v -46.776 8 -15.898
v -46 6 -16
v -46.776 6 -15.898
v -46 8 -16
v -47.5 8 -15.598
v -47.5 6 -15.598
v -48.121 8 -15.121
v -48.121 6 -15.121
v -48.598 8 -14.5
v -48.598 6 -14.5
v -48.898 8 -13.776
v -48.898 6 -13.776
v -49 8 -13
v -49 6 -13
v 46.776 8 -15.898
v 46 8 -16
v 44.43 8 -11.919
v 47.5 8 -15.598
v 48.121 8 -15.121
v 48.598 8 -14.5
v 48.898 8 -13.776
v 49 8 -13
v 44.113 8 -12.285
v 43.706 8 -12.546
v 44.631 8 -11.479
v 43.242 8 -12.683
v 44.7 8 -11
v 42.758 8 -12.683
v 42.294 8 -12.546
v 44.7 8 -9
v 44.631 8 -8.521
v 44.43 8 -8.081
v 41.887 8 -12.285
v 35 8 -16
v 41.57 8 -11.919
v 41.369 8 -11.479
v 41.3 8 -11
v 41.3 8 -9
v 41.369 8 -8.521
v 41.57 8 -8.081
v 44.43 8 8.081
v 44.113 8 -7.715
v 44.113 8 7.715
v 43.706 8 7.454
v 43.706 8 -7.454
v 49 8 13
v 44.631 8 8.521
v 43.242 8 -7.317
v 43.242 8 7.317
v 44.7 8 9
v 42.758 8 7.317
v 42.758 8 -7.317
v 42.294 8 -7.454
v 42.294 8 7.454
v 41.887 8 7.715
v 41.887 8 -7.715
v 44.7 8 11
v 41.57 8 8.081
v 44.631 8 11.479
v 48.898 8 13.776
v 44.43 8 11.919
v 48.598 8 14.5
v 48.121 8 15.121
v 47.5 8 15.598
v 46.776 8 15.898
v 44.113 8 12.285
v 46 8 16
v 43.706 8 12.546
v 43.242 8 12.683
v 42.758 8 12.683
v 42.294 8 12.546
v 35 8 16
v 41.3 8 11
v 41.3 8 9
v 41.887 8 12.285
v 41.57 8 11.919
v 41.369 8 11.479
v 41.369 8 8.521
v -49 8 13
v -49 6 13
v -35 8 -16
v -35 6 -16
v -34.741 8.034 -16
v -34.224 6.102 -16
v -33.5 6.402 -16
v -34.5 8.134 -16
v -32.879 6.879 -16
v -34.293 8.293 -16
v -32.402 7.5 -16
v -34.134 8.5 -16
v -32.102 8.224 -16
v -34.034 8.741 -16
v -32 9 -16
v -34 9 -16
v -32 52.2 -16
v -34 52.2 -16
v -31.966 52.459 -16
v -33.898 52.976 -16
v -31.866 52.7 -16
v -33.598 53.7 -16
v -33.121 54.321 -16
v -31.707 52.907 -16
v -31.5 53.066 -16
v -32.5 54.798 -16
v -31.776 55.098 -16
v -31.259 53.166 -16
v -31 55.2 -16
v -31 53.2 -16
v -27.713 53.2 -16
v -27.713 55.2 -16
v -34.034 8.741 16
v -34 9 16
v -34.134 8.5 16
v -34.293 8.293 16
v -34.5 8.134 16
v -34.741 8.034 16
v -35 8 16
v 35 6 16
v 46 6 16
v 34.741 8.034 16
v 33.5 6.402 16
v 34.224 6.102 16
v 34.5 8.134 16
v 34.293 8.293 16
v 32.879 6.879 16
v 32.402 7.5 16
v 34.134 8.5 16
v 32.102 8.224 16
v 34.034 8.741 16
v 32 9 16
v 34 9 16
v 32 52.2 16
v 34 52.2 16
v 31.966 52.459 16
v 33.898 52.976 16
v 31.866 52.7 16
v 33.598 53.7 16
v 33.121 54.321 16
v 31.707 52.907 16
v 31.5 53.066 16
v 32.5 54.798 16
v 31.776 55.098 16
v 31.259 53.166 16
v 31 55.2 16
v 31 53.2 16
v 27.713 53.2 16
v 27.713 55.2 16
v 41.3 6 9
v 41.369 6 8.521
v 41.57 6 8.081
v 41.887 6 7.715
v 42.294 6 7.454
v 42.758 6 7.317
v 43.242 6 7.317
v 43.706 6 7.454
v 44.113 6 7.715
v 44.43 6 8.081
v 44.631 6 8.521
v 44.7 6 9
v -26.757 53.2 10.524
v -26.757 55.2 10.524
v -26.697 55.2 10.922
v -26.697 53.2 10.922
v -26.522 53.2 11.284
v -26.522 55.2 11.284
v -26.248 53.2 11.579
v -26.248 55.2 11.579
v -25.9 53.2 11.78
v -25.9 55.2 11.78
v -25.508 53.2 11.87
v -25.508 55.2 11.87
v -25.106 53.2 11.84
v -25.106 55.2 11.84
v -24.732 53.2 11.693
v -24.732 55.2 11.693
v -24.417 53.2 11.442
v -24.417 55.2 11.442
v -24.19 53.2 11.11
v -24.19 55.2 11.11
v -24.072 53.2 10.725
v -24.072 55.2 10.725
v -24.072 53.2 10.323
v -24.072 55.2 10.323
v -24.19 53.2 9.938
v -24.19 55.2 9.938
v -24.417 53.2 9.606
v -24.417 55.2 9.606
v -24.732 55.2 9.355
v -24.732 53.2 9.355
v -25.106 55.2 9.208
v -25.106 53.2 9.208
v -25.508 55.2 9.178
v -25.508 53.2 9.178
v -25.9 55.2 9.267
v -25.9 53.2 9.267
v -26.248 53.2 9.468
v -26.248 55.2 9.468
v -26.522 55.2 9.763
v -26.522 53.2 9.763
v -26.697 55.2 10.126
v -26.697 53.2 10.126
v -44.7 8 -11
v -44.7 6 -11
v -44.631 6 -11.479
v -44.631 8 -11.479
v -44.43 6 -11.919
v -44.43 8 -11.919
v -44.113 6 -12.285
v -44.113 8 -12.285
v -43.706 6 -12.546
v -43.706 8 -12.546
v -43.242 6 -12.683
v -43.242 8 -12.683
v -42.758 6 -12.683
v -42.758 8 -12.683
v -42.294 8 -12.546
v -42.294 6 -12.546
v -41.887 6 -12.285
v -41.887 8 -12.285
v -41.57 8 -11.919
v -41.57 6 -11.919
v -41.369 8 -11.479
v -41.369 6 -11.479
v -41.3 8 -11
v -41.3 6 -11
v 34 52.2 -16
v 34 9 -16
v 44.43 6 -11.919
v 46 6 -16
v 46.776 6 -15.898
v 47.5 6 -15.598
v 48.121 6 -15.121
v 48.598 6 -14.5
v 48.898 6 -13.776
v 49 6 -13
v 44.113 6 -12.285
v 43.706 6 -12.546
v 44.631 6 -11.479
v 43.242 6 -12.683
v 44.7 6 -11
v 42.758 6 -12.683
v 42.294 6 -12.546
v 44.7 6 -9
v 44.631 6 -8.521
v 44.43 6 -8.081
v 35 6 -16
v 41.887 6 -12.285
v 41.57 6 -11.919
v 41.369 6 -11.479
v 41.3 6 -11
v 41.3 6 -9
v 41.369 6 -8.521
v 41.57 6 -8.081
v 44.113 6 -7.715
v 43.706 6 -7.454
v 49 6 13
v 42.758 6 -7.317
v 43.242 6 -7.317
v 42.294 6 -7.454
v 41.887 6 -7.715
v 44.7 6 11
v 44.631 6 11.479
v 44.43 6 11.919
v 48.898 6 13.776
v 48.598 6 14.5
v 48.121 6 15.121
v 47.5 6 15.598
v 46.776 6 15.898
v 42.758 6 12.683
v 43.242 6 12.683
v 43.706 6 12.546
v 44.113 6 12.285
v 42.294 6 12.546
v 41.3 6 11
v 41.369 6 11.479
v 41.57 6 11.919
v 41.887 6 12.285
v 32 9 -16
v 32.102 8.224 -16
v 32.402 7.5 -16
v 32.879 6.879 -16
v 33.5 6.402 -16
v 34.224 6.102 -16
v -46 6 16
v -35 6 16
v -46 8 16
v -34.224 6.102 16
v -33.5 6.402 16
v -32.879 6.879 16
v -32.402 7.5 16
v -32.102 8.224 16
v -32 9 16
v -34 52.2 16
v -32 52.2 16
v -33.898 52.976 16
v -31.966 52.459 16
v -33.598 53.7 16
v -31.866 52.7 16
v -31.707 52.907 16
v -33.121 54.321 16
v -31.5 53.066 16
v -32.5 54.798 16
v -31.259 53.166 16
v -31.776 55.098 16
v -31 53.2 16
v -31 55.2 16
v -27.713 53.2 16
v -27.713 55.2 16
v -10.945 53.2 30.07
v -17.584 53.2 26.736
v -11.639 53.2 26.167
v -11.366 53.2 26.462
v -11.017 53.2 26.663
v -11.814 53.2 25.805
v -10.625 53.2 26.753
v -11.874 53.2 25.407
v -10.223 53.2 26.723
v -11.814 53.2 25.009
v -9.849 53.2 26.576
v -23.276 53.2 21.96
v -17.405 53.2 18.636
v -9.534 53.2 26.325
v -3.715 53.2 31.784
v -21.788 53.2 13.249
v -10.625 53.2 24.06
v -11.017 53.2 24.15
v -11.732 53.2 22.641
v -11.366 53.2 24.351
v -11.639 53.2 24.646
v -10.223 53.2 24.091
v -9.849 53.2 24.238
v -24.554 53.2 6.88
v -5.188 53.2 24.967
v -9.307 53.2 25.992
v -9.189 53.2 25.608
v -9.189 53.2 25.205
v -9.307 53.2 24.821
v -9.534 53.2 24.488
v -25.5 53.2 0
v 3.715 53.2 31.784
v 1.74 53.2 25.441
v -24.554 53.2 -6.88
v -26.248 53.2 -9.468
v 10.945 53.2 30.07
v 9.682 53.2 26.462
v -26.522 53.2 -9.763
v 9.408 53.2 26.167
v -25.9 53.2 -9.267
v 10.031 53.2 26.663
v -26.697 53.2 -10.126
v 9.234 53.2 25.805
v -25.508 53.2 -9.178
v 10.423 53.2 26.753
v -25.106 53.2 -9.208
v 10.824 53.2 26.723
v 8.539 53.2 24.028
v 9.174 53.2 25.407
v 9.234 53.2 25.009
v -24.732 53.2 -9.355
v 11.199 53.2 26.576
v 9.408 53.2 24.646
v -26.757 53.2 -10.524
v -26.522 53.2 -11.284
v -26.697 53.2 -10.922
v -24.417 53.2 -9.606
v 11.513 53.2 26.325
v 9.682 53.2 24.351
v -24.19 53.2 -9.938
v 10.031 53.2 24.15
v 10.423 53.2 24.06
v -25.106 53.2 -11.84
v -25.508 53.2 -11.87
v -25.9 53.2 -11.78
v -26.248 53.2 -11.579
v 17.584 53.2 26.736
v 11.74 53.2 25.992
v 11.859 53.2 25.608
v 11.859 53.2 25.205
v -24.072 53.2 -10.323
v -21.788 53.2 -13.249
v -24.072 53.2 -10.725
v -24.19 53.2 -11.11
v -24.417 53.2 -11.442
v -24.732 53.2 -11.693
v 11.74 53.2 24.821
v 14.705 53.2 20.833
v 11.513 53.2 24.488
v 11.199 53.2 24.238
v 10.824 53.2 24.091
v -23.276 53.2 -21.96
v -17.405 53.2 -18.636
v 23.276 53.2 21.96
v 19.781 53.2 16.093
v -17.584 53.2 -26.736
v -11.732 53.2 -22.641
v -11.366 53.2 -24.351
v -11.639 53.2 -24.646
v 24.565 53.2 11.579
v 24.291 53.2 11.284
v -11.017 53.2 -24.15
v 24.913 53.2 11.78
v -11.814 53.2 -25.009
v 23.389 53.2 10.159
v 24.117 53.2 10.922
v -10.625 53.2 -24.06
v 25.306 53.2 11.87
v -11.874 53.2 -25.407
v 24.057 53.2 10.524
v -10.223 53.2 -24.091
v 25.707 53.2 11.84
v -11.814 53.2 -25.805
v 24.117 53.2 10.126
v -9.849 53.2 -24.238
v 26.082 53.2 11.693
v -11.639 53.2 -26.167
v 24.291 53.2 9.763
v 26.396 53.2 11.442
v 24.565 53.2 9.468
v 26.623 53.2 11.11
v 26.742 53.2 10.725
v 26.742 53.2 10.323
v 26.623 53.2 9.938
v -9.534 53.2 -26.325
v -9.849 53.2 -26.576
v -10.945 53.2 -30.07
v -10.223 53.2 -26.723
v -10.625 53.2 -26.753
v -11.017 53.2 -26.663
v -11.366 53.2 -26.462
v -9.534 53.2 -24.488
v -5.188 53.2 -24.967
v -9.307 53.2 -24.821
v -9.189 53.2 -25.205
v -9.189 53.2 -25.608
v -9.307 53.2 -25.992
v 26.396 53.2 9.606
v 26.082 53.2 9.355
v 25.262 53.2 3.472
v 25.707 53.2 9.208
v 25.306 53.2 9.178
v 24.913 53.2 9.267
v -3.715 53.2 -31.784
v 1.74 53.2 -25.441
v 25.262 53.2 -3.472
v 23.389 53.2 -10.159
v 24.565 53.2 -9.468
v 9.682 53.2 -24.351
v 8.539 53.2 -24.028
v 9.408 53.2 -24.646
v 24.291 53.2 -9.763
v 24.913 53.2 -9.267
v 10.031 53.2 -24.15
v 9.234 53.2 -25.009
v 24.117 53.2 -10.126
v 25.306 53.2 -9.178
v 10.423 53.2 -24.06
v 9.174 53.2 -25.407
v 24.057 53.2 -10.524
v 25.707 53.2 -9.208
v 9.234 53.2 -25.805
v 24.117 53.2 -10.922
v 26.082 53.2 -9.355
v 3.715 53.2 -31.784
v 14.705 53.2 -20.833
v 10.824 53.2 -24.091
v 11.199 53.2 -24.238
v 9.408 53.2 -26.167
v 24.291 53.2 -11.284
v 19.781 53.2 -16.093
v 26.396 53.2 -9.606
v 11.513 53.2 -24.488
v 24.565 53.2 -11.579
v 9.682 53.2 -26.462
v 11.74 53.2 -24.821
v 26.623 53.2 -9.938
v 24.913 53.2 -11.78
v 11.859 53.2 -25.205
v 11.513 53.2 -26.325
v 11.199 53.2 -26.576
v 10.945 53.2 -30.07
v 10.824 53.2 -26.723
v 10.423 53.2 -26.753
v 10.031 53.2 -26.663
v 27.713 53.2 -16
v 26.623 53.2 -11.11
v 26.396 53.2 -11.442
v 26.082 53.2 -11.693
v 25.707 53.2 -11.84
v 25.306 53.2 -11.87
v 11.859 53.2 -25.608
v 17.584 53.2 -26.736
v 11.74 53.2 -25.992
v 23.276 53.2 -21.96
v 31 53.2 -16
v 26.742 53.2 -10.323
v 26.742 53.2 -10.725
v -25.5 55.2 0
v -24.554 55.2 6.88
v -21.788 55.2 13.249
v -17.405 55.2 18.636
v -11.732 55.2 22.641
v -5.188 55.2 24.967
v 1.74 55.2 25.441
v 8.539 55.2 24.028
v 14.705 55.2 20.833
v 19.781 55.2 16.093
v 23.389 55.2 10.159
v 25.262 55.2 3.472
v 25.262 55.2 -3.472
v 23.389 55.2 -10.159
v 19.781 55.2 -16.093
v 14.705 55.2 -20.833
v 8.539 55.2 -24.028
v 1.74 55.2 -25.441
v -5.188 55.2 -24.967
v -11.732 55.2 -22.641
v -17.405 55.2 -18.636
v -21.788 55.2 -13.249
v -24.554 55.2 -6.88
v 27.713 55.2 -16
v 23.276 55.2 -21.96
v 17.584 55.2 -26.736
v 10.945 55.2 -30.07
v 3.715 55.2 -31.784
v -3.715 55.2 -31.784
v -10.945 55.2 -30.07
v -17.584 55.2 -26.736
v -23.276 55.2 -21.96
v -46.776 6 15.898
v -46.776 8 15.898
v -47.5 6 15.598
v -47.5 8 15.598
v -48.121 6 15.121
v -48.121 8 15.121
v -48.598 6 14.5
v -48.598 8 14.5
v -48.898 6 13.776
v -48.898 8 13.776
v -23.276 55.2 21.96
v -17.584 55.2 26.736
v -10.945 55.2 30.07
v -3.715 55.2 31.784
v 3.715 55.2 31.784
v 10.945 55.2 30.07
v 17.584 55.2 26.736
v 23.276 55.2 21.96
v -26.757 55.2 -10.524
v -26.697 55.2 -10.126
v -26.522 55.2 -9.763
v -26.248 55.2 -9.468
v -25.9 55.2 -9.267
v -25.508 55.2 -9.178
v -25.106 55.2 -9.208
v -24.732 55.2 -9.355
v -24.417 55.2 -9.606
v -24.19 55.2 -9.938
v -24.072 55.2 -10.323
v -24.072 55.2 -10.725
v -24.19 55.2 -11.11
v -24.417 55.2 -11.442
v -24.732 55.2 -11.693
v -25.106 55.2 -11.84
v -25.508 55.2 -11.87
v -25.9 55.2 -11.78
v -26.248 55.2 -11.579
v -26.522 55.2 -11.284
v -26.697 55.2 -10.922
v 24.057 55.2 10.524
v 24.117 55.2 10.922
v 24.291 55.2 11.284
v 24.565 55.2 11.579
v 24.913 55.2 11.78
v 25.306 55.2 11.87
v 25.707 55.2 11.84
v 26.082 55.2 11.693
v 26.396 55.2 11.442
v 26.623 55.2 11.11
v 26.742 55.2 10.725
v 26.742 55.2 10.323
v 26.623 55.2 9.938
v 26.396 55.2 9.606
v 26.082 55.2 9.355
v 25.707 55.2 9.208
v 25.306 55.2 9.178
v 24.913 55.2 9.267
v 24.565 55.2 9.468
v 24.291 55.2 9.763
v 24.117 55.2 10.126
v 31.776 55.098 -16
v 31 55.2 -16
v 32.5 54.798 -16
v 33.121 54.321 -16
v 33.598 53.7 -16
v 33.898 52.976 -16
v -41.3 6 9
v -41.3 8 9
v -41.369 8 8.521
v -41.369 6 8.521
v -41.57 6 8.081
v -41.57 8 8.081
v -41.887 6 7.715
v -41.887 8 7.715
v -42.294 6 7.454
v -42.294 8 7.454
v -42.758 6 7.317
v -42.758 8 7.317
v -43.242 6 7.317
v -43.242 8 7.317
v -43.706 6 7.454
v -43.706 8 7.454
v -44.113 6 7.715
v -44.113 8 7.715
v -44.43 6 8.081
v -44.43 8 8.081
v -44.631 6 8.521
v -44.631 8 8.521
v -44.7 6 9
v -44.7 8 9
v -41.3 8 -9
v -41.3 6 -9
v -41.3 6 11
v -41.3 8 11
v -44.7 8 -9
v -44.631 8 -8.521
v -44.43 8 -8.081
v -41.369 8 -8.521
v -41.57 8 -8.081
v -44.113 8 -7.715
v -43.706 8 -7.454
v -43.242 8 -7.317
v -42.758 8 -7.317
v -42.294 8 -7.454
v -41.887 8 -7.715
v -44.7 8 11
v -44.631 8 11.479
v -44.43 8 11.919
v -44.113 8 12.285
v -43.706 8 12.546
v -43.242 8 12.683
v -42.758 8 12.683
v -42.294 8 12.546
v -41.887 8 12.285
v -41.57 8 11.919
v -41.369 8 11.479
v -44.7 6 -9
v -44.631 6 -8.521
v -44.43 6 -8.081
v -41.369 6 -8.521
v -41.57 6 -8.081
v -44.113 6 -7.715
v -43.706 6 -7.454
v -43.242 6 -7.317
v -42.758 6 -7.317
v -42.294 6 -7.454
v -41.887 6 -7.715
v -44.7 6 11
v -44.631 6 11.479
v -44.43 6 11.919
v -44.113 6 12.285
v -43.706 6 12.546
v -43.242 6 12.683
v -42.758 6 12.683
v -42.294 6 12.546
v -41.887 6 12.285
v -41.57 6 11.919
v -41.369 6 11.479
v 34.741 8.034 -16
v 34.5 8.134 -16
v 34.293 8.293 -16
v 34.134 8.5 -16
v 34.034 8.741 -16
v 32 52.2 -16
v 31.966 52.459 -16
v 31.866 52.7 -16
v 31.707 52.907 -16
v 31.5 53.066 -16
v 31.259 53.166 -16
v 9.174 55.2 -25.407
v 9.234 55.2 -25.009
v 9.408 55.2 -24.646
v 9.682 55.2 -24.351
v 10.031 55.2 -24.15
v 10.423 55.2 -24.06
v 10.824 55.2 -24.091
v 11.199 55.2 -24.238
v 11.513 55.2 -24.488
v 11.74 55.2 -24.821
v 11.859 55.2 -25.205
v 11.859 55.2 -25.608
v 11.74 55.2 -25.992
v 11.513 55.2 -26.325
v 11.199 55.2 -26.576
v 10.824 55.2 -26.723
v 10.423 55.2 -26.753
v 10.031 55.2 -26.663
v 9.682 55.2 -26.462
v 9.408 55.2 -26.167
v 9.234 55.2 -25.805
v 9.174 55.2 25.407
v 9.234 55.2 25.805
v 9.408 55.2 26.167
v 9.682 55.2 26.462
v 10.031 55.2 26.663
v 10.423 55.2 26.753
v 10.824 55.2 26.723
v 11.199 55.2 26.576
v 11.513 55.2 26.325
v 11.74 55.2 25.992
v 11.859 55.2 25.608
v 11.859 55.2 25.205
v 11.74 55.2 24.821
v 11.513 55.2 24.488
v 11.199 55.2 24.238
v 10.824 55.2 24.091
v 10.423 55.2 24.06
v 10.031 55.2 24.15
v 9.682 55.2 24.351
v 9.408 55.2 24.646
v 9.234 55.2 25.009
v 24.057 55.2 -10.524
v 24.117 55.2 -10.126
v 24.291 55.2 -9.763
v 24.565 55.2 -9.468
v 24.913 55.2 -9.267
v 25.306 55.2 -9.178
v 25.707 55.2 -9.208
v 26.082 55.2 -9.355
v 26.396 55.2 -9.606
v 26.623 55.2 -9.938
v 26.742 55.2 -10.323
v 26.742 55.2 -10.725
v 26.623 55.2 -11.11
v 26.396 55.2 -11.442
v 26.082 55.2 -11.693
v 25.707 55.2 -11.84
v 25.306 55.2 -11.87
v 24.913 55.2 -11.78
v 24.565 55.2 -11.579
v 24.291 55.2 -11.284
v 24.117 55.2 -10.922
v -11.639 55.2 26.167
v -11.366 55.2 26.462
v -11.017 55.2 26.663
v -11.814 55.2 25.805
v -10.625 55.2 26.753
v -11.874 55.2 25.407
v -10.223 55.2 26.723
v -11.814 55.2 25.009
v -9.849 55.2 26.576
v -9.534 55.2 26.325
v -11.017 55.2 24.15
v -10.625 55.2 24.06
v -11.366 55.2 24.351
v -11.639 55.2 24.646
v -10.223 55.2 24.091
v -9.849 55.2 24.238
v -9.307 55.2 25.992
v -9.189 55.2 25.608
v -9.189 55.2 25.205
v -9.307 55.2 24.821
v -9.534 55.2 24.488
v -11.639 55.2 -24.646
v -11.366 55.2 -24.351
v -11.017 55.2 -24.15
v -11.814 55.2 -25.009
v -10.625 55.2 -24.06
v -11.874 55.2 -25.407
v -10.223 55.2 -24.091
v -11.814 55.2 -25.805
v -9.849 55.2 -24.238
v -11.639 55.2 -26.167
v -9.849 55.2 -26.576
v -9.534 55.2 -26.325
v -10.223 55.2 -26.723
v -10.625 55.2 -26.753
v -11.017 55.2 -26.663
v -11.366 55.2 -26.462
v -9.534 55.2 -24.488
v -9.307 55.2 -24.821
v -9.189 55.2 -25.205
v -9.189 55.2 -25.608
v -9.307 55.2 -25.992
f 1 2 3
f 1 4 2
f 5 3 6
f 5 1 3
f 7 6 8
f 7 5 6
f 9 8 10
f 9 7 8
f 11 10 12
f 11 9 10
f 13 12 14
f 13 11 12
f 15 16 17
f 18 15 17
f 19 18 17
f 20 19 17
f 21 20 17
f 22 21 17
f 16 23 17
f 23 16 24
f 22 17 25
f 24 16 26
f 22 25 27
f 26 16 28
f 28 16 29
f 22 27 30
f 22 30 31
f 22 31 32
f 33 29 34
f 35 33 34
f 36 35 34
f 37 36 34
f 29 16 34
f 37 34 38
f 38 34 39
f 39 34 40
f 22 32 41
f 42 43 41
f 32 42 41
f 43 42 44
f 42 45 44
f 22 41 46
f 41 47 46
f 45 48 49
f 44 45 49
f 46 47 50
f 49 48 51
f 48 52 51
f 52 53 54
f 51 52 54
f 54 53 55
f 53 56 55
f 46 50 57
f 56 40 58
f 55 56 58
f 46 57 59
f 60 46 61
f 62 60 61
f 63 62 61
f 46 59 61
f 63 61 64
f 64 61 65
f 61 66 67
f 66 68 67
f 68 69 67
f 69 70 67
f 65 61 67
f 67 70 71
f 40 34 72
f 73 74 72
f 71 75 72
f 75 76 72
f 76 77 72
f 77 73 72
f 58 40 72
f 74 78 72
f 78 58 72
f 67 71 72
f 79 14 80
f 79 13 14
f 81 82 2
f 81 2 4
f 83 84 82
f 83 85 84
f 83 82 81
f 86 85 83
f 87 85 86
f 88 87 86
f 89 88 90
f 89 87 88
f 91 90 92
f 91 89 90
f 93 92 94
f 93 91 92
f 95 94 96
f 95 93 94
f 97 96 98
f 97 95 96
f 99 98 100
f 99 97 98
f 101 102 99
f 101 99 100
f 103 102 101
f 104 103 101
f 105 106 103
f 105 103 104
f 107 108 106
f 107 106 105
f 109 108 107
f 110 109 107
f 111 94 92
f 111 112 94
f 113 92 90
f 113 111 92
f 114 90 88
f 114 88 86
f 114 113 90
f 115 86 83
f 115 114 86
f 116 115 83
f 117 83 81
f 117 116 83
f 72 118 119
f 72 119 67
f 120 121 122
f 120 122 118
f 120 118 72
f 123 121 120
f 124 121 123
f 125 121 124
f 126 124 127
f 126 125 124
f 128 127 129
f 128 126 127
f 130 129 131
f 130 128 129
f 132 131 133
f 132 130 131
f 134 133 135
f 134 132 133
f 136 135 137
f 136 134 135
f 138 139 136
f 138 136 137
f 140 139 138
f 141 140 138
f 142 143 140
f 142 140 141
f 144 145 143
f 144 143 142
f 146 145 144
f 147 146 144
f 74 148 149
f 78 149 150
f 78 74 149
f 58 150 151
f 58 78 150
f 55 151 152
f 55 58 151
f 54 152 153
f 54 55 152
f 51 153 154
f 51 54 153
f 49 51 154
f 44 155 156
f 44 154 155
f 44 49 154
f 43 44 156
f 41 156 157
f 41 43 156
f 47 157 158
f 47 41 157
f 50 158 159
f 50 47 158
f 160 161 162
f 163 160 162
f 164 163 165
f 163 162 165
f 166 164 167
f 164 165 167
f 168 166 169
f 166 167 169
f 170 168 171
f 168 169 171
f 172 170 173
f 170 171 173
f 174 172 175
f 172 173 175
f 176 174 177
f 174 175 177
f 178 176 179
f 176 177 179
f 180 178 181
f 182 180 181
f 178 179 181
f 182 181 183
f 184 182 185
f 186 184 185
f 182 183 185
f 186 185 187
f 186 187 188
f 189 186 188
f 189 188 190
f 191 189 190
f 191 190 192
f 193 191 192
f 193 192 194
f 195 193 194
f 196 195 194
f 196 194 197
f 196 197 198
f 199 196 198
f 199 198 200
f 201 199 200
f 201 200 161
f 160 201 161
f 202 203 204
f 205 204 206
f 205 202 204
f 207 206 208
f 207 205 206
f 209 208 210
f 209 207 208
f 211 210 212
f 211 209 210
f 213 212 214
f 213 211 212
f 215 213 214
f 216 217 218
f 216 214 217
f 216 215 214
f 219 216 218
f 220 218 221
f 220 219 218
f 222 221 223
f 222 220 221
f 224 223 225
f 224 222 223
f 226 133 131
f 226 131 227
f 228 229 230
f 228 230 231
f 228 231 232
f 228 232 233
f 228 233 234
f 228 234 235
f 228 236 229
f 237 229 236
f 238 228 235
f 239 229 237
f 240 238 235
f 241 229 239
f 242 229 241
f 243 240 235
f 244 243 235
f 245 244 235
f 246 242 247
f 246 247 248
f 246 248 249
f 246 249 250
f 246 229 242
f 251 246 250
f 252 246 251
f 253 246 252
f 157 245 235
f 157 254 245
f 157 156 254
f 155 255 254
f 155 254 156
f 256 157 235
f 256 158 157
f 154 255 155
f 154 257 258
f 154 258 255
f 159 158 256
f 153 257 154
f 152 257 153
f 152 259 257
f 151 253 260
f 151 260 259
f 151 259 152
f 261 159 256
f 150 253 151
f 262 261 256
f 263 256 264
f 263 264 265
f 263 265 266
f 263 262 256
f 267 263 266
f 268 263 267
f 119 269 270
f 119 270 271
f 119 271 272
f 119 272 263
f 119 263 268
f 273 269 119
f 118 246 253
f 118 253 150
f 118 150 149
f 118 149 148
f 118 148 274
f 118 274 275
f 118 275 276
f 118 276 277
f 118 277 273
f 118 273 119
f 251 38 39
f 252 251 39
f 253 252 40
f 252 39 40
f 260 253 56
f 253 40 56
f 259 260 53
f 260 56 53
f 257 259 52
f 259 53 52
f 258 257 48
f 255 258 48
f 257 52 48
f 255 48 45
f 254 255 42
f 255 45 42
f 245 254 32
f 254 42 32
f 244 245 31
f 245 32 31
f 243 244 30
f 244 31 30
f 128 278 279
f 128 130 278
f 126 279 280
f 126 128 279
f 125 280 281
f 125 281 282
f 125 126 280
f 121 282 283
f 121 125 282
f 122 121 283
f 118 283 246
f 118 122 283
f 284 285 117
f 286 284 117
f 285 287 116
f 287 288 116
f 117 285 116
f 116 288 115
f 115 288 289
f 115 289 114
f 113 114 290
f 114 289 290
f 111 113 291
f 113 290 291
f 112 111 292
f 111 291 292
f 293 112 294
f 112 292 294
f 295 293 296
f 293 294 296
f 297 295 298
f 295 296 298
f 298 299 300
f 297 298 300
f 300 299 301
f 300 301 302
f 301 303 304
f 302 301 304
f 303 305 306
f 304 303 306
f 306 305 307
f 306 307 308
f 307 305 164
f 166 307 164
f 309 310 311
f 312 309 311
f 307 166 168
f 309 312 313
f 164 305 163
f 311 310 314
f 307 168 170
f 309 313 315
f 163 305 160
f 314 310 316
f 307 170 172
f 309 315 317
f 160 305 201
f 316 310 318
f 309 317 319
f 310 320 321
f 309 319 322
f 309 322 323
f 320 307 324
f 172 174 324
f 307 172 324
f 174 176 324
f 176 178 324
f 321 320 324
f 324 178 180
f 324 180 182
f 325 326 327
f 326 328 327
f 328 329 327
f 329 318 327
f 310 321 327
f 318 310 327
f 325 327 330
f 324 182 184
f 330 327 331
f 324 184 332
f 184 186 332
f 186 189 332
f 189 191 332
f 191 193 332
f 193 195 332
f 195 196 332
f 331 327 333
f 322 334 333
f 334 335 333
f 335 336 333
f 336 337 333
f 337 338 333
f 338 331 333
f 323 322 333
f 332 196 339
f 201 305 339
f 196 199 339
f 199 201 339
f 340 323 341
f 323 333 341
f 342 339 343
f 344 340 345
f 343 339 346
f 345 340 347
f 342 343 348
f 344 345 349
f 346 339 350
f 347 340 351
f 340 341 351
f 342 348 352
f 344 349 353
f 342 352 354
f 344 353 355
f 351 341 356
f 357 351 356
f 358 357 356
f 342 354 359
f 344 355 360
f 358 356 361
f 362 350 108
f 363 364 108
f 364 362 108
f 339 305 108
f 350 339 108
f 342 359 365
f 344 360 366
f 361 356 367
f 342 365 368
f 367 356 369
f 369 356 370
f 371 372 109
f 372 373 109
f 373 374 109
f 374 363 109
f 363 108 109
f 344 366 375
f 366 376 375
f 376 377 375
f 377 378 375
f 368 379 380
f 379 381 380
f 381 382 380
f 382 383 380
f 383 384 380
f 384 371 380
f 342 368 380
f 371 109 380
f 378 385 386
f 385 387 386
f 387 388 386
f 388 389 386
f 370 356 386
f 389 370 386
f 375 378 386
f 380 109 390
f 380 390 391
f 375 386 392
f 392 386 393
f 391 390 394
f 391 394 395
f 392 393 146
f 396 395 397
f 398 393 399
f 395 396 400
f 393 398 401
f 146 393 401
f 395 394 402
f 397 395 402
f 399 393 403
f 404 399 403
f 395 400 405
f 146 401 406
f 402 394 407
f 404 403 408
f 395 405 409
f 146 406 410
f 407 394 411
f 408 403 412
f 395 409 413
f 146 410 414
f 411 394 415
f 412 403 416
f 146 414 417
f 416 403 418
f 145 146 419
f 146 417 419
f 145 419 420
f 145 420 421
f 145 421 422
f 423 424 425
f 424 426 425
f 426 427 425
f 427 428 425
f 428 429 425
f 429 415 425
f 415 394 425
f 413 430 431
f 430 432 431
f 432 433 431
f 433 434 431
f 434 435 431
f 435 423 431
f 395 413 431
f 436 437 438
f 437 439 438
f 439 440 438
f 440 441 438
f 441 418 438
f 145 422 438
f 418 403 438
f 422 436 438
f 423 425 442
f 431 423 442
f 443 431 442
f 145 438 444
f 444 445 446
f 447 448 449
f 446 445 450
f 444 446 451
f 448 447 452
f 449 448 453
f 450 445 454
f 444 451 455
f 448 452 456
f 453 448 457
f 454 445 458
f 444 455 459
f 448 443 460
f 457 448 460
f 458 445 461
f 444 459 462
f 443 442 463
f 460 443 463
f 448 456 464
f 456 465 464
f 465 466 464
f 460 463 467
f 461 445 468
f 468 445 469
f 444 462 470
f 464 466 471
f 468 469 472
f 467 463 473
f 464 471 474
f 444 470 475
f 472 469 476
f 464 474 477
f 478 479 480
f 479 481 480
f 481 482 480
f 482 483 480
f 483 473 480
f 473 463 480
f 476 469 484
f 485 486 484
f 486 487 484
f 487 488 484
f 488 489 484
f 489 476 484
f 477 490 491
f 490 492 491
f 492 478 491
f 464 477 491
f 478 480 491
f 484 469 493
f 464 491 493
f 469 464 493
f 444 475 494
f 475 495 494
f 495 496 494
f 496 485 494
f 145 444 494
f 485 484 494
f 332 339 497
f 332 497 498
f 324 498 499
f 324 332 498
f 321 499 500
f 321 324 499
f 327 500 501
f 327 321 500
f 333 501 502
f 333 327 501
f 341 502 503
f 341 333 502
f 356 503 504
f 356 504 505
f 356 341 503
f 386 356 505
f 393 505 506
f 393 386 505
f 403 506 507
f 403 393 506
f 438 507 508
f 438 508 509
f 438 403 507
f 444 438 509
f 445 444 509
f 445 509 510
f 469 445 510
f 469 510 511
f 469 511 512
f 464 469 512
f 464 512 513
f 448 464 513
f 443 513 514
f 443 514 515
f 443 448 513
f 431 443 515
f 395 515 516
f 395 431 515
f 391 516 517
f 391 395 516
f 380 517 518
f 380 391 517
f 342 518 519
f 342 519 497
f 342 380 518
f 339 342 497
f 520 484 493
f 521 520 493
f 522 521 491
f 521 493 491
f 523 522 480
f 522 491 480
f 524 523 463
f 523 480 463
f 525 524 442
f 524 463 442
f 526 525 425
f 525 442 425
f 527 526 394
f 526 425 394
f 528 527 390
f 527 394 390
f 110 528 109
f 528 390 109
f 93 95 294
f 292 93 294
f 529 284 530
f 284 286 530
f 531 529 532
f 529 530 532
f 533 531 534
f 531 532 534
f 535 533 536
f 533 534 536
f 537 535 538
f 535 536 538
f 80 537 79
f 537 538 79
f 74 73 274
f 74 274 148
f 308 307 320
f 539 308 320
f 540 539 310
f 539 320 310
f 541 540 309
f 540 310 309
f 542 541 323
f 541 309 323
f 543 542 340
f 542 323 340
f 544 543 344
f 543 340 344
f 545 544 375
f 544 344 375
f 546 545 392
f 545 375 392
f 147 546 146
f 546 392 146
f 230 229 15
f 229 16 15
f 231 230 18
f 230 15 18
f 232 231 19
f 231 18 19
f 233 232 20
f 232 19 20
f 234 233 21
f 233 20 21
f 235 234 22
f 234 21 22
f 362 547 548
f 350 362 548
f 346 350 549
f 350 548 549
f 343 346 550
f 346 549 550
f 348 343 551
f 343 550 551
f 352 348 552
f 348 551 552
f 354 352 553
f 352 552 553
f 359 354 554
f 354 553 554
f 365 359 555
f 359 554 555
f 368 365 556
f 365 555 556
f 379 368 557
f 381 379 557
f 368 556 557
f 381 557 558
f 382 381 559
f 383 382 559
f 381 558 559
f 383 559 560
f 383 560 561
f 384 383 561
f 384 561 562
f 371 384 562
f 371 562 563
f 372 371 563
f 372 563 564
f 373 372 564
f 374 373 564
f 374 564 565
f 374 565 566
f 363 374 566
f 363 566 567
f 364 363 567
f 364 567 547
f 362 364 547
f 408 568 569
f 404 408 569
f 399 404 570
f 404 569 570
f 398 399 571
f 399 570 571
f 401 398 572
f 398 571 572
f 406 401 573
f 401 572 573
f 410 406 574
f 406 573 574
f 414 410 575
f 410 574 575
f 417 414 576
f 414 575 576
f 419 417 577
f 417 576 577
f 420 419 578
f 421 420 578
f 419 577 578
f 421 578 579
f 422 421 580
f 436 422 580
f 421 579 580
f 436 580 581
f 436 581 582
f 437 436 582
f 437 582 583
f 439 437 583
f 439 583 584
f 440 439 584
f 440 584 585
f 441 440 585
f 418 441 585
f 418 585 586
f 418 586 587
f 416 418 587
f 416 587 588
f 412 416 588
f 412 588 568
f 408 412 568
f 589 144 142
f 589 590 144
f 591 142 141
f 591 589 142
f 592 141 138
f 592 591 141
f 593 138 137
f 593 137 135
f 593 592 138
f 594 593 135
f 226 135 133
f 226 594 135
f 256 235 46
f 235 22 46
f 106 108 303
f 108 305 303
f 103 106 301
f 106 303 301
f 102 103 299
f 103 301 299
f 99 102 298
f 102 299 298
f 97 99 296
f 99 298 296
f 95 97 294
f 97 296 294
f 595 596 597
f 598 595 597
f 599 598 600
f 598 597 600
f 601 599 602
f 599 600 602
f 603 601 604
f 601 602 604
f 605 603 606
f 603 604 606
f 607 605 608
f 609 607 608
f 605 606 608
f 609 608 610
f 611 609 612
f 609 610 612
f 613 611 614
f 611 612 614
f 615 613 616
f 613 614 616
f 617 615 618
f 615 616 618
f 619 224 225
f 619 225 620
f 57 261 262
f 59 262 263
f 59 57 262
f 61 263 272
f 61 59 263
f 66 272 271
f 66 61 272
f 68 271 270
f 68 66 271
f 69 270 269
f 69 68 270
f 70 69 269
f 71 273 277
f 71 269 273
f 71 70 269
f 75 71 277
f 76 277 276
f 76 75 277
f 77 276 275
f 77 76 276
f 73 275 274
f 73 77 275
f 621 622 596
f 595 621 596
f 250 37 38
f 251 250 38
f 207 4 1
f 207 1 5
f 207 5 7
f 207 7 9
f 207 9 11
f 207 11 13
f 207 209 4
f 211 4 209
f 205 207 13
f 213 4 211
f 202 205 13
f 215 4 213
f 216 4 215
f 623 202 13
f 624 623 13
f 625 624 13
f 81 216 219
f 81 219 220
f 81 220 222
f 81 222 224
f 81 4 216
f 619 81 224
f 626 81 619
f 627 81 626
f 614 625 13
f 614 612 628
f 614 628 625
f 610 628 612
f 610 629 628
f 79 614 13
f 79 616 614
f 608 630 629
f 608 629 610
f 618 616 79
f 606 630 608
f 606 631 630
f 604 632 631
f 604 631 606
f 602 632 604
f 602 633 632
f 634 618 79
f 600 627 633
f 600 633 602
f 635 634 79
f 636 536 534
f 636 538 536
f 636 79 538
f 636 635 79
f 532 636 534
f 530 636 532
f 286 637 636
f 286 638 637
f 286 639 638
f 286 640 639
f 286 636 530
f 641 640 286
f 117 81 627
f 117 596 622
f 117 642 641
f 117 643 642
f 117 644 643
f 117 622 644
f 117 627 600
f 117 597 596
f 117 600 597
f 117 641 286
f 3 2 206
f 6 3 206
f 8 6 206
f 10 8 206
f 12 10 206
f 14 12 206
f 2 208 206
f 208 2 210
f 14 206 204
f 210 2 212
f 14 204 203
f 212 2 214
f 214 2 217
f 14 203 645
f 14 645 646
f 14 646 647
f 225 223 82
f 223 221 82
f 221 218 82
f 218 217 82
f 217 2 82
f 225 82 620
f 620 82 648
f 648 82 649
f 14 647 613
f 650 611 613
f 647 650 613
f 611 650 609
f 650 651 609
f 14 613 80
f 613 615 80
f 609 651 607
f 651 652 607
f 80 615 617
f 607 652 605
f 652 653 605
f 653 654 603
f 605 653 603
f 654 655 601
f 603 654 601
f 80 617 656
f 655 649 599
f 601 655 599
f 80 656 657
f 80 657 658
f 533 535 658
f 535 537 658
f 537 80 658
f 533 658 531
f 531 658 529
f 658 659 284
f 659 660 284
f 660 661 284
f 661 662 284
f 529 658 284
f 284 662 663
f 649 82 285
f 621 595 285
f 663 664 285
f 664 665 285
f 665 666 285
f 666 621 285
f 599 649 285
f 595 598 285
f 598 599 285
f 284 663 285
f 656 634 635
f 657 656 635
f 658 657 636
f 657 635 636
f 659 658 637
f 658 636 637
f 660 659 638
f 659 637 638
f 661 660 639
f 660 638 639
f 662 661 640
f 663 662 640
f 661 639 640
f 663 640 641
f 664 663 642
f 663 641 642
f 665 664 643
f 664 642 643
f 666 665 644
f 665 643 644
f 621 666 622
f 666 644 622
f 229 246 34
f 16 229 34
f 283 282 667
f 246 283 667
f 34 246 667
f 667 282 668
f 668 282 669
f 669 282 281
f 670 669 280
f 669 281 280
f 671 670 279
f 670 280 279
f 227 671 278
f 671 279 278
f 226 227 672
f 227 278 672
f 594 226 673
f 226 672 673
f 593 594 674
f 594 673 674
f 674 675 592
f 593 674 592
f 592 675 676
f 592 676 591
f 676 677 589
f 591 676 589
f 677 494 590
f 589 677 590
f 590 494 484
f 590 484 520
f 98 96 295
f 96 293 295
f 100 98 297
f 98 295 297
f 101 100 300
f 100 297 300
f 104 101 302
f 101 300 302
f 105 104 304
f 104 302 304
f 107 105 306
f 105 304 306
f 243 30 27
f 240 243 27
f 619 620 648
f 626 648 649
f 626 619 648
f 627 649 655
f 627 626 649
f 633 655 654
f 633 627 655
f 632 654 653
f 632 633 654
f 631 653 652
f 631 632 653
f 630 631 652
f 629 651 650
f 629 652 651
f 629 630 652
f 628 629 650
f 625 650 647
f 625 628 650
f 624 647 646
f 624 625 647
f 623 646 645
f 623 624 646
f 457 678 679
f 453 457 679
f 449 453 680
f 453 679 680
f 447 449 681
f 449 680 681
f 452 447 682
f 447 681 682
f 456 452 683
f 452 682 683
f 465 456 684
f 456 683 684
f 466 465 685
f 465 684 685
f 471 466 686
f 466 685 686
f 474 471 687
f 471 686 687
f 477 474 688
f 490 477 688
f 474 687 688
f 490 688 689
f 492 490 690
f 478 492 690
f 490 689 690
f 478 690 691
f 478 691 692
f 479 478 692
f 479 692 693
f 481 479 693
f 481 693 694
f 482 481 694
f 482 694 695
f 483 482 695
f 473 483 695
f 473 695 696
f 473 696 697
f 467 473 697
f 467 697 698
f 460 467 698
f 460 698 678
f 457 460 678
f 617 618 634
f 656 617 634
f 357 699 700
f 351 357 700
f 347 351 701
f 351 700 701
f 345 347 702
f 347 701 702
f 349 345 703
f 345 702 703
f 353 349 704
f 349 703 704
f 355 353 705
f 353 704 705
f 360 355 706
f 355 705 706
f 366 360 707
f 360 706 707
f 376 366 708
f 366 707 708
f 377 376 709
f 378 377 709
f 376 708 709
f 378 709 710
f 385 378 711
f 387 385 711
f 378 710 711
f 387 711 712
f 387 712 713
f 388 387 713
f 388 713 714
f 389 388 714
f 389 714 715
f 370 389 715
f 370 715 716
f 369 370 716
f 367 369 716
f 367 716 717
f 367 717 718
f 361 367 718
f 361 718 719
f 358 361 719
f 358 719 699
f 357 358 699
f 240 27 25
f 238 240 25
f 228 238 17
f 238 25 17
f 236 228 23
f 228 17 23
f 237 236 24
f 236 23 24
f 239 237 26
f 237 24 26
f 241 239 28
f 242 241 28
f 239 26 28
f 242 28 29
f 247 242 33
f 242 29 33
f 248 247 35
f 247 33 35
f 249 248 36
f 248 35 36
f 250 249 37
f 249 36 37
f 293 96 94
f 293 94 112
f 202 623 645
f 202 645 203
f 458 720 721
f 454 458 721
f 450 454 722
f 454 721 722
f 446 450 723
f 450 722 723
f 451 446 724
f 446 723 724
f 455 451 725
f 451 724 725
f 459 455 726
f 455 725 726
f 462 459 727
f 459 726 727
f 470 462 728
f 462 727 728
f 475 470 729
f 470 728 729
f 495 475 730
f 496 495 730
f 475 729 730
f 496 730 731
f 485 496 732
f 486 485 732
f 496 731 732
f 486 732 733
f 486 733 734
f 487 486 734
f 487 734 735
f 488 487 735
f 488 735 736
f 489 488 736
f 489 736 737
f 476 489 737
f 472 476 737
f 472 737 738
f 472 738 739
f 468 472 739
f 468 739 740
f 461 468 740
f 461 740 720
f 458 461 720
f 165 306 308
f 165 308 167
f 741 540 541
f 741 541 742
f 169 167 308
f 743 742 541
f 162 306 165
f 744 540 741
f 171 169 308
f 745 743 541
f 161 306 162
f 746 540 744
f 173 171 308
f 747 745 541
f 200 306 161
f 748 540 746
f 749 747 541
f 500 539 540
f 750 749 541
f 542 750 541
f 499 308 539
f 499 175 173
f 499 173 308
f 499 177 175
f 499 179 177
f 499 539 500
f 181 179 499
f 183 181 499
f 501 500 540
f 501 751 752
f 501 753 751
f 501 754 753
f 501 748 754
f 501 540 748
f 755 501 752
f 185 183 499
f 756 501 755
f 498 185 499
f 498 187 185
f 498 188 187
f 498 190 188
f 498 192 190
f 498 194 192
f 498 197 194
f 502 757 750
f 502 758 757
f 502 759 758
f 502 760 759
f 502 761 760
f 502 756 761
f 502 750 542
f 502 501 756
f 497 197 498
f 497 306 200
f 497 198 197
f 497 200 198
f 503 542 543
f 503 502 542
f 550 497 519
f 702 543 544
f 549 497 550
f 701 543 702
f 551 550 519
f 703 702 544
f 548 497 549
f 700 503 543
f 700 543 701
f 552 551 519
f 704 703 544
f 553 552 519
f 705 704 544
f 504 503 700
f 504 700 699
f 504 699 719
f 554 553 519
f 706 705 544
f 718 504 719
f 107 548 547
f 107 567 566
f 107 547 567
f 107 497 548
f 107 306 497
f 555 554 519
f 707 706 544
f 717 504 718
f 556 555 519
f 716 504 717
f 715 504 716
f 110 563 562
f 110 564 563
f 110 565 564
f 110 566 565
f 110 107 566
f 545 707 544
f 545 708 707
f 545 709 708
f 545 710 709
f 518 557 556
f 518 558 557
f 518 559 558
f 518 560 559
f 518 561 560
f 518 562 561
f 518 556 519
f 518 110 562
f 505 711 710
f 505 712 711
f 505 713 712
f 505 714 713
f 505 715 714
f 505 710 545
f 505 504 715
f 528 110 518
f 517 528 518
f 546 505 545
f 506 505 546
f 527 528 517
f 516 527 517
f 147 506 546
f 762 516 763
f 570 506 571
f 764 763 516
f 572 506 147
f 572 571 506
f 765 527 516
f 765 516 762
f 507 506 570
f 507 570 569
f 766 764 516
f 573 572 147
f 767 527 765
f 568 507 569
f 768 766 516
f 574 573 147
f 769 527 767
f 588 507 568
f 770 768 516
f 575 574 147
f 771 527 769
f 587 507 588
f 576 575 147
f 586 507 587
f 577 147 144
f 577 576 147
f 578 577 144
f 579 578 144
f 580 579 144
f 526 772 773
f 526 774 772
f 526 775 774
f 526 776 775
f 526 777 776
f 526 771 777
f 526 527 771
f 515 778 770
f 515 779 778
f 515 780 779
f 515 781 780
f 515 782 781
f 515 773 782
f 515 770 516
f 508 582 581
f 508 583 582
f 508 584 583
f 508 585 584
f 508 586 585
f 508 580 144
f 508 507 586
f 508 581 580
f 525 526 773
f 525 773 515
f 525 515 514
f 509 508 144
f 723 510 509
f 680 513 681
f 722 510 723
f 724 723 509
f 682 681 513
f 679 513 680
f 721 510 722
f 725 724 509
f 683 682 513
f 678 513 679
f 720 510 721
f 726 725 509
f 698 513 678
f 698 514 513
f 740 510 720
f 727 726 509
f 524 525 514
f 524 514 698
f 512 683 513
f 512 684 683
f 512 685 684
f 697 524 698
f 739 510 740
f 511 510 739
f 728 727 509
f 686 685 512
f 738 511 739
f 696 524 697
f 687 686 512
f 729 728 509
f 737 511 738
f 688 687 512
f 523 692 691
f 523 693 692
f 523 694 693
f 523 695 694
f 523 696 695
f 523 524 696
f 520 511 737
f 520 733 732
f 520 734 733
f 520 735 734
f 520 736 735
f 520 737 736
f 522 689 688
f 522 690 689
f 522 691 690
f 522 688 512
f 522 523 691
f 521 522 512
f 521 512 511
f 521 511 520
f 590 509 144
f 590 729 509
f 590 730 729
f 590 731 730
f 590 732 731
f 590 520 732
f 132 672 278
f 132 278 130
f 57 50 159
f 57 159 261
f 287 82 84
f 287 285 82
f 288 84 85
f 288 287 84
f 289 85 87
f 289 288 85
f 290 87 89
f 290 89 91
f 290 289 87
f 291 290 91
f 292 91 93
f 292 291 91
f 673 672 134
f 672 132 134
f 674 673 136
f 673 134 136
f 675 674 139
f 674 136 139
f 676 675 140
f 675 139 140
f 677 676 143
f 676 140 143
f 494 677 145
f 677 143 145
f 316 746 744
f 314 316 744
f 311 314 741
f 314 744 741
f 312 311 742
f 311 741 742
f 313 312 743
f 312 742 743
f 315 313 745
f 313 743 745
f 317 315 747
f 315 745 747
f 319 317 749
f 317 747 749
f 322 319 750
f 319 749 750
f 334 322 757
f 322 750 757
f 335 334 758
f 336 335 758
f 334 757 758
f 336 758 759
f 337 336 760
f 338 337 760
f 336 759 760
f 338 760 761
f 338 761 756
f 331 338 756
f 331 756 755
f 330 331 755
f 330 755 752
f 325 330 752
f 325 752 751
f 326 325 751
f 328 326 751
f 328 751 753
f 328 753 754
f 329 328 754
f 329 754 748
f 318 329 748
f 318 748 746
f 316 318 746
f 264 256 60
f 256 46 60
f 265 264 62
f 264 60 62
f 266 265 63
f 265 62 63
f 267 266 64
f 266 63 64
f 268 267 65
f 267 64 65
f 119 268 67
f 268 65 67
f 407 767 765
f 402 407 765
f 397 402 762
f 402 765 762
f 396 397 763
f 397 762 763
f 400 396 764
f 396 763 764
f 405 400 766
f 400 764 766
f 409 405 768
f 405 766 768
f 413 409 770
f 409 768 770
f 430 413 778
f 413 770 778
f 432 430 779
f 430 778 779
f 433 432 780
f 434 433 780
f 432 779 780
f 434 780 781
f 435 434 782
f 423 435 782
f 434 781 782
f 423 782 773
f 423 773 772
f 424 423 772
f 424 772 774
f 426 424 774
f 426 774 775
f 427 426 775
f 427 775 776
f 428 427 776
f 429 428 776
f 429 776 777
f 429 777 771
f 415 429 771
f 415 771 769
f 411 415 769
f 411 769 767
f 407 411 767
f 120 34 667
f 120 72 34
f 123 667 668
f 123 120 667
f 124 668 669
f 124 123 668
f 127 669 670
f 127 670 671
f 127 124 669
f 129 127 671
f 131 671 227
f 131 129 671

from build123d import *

# Parameters (mm, degrees)
SKETCH_1_R          = 25.5
EXTRUDE_1_DEPTH     = 2
SKETCH_2_W          = 2
SKETCH_2_H          = 32
EXTRUDE_2_DEPTH     = 47.2
SKETCH_3_W          = 32
SKETCH_3_H          = 2
EXTRUDE_3_DEPTH     = 15
FILLET_1_R          = 3
FILLET_2_R          = 1
SKETCH_4_R          = 1.35
CUT_EXTRUDE_1_DEPTH = 10
CUT_EXTRUDE_2_DEPTH = 10
FILLET_3_R          = 3


with BuildPart() as part:
    # 草图1 → 凸台-拉伸1 (new body)
    with BuildSketch(Plane(origin=(0, 53.2, 0), x_dir=(1, 0, 0), z_dir=(0, 1, 0))):
        with BuildLine():
            Line((-34, 16), (-34, -16))
            Line((-34, -16), (-27.712812921, -16))
            ThreePointArc((-27.712812921, -16), (0, -32), (27.712812921, -16))
            Line((27.712812921, -16), (34, -16))
            Line((34, -16), (34, 16))
            Line((34, 16), (27.712812921, 16))
            ThreePointArc((27.712812921, 16), (0, 32), (-27.712812921, 16))
            Line((-27.712812921, 16), (-34, 16))
        make_face()
        with Locations(Location((0, 0, 0), (0, 0, 180))):
            Circle(SKETCH_1_R, mode=Mode.SUBTRACT)
    extrude(amount=EXTRUDE_1_DEPTH)

    # 草图2 → 凸台-拉伸2 (add)
    with BuildSketch(Plane.XZ.offset(-53.2)):
        with Locations((-33, 0)):
            Rectangle(SKETCH_2_W, SKETCH_2_H)
        with Locations((33, 0)):
            Rectangle(SKETCH_2_W, SKETCH_2_H)
    extrude(amount=EXTRUDE_2_DEPTH)

    # 草图3 → 凸台-拉伸3 (add)
    with BuildSketch(Plane.ZY.offset(34)):
        with Locations((0, 7)):
            Rectangle(SKETCH_3_W, SKETCH_3_H)
    extrude_3 = extrude(amount=EXTRUDE_3_DEPTH)

    # 镜向1: 凸台-拉伸3 across plane
    add(extrude_3.mirror(Plane.ZY))

    # 圆角1
    fillet_1_edges = [part.edges().sort_by_distance(p)[0] for p in [
        (34, 55.2, 0),
        (-32, 6, 0),
        (32, 6, 0),
        (-34, 55.2, 0),
    ]]
    fillet(fillet_1_edges, radius=FILLET_1_R)

    # 圆角2
    fillet_2_edges = [part.edges().sort_by_distance(p)[0] for p in [
        (-32, 53.2, 0),
        (32, 53.2, 0),
        (-34, 8, 0),
        (34, 8, 0),
    ]]
    fillet(fillet_2_edges, radius=FILLET_2_R)

    # 草图4 → 切除-拉伸1 (cut)
    with BuildSketch(Plane(origin=(0, 55.2, 0), x_dir=(1, 0, 0), z_dir=(0, 1, 0))):
        with Locations(Location((-10.52379439, 25.406687144, 0), (0, 0, 180))):
            Circle(SKETCH_4_R)
        with Locations(Location((10.52379439, 25.406687144, 0), (0, 0, 180))):
            Circle(SKETCH_4_R)
        with Locations(Location((25.406687144, 10.52379439, 0), (0, 0, 180))):
            Circle(SKETCH_4_R)
        with Locations(Location((25.406687144, -10.52379439, 0), (0, 0, 180))):
            Circle(SKETCH_4_R)
        with Locations(Location((10.52379439, -25.406687144, 0), (0, 0, 180))):
            Circle(SKETCH_4_R)
        with Locations(Location((-10.52379439, -25.406687144, 0), (0, 0, 180))):
            Circle(SKETCH_4_R)
        with Locations(Location((-25.406687144, -10.52379439, 0), (0, 0, 180))):
            Circle(SKETCH_4_R)
        with Locations(Location((-25.406687144, 10.52379439, 0), (0, 0, 180))):
            Circle(SKETCH_4_R)
    extrude(amount=-CUT_EXTRUDE_1_DEPTH, mode=Mode.SUBTRACT)

    # 草图6 → 切除-拉伸2 (cut)
    with BuildSketch(Plane(origin=(0, 8, 0), x_dir=(1, 0, 0), z_dir=(0, 1, 0))):
        with BuildLine():
            Line((-41.3, 11), (-41.3, 9))
            ThreePointArc((-41.3, 9), (-43, 7.3), (-44.7, 9))
            Line((-44.7, 9), (-44.7, 11))
            ThreePointArc((-44.7, 11), (-43, 12.7), (-41.3, 11))
        make_face()
        with BuildLine():
            Line((-41.3, -11), (-41.3, -9))
            ThreePointArc((-41.3, -9), (-43, -7.3), (-44.7, -9))
            Line((-44.7, -9), (-44.7, -11))
            ThreePointArc((-44.7, -11), (-43, -12.7), (-41.3, -11))
        make_face()
    cut_extrude_2 = extrude(amount=-CUT_EXTRUDE_2_DEPTH, mode=Mode.SUBTRACT)

    # 镜向2: 切除-拉伸2 across plane
    add(cut_extrude_2.mirror(Plane.ZY), mode=Mode.SUBTRACT)

    # 圆角3
    fillet_3_edges = [part.edges().sort_by_distance(p)[0] for p in [
        (-49, 7, 16),
        (-49, 7, -16),
        (49, 7, 16),
        (49, 7, -16),
    ]]
    fillet(fillet_3_edges, radius=FILLET_3_R)


solid = part.part
